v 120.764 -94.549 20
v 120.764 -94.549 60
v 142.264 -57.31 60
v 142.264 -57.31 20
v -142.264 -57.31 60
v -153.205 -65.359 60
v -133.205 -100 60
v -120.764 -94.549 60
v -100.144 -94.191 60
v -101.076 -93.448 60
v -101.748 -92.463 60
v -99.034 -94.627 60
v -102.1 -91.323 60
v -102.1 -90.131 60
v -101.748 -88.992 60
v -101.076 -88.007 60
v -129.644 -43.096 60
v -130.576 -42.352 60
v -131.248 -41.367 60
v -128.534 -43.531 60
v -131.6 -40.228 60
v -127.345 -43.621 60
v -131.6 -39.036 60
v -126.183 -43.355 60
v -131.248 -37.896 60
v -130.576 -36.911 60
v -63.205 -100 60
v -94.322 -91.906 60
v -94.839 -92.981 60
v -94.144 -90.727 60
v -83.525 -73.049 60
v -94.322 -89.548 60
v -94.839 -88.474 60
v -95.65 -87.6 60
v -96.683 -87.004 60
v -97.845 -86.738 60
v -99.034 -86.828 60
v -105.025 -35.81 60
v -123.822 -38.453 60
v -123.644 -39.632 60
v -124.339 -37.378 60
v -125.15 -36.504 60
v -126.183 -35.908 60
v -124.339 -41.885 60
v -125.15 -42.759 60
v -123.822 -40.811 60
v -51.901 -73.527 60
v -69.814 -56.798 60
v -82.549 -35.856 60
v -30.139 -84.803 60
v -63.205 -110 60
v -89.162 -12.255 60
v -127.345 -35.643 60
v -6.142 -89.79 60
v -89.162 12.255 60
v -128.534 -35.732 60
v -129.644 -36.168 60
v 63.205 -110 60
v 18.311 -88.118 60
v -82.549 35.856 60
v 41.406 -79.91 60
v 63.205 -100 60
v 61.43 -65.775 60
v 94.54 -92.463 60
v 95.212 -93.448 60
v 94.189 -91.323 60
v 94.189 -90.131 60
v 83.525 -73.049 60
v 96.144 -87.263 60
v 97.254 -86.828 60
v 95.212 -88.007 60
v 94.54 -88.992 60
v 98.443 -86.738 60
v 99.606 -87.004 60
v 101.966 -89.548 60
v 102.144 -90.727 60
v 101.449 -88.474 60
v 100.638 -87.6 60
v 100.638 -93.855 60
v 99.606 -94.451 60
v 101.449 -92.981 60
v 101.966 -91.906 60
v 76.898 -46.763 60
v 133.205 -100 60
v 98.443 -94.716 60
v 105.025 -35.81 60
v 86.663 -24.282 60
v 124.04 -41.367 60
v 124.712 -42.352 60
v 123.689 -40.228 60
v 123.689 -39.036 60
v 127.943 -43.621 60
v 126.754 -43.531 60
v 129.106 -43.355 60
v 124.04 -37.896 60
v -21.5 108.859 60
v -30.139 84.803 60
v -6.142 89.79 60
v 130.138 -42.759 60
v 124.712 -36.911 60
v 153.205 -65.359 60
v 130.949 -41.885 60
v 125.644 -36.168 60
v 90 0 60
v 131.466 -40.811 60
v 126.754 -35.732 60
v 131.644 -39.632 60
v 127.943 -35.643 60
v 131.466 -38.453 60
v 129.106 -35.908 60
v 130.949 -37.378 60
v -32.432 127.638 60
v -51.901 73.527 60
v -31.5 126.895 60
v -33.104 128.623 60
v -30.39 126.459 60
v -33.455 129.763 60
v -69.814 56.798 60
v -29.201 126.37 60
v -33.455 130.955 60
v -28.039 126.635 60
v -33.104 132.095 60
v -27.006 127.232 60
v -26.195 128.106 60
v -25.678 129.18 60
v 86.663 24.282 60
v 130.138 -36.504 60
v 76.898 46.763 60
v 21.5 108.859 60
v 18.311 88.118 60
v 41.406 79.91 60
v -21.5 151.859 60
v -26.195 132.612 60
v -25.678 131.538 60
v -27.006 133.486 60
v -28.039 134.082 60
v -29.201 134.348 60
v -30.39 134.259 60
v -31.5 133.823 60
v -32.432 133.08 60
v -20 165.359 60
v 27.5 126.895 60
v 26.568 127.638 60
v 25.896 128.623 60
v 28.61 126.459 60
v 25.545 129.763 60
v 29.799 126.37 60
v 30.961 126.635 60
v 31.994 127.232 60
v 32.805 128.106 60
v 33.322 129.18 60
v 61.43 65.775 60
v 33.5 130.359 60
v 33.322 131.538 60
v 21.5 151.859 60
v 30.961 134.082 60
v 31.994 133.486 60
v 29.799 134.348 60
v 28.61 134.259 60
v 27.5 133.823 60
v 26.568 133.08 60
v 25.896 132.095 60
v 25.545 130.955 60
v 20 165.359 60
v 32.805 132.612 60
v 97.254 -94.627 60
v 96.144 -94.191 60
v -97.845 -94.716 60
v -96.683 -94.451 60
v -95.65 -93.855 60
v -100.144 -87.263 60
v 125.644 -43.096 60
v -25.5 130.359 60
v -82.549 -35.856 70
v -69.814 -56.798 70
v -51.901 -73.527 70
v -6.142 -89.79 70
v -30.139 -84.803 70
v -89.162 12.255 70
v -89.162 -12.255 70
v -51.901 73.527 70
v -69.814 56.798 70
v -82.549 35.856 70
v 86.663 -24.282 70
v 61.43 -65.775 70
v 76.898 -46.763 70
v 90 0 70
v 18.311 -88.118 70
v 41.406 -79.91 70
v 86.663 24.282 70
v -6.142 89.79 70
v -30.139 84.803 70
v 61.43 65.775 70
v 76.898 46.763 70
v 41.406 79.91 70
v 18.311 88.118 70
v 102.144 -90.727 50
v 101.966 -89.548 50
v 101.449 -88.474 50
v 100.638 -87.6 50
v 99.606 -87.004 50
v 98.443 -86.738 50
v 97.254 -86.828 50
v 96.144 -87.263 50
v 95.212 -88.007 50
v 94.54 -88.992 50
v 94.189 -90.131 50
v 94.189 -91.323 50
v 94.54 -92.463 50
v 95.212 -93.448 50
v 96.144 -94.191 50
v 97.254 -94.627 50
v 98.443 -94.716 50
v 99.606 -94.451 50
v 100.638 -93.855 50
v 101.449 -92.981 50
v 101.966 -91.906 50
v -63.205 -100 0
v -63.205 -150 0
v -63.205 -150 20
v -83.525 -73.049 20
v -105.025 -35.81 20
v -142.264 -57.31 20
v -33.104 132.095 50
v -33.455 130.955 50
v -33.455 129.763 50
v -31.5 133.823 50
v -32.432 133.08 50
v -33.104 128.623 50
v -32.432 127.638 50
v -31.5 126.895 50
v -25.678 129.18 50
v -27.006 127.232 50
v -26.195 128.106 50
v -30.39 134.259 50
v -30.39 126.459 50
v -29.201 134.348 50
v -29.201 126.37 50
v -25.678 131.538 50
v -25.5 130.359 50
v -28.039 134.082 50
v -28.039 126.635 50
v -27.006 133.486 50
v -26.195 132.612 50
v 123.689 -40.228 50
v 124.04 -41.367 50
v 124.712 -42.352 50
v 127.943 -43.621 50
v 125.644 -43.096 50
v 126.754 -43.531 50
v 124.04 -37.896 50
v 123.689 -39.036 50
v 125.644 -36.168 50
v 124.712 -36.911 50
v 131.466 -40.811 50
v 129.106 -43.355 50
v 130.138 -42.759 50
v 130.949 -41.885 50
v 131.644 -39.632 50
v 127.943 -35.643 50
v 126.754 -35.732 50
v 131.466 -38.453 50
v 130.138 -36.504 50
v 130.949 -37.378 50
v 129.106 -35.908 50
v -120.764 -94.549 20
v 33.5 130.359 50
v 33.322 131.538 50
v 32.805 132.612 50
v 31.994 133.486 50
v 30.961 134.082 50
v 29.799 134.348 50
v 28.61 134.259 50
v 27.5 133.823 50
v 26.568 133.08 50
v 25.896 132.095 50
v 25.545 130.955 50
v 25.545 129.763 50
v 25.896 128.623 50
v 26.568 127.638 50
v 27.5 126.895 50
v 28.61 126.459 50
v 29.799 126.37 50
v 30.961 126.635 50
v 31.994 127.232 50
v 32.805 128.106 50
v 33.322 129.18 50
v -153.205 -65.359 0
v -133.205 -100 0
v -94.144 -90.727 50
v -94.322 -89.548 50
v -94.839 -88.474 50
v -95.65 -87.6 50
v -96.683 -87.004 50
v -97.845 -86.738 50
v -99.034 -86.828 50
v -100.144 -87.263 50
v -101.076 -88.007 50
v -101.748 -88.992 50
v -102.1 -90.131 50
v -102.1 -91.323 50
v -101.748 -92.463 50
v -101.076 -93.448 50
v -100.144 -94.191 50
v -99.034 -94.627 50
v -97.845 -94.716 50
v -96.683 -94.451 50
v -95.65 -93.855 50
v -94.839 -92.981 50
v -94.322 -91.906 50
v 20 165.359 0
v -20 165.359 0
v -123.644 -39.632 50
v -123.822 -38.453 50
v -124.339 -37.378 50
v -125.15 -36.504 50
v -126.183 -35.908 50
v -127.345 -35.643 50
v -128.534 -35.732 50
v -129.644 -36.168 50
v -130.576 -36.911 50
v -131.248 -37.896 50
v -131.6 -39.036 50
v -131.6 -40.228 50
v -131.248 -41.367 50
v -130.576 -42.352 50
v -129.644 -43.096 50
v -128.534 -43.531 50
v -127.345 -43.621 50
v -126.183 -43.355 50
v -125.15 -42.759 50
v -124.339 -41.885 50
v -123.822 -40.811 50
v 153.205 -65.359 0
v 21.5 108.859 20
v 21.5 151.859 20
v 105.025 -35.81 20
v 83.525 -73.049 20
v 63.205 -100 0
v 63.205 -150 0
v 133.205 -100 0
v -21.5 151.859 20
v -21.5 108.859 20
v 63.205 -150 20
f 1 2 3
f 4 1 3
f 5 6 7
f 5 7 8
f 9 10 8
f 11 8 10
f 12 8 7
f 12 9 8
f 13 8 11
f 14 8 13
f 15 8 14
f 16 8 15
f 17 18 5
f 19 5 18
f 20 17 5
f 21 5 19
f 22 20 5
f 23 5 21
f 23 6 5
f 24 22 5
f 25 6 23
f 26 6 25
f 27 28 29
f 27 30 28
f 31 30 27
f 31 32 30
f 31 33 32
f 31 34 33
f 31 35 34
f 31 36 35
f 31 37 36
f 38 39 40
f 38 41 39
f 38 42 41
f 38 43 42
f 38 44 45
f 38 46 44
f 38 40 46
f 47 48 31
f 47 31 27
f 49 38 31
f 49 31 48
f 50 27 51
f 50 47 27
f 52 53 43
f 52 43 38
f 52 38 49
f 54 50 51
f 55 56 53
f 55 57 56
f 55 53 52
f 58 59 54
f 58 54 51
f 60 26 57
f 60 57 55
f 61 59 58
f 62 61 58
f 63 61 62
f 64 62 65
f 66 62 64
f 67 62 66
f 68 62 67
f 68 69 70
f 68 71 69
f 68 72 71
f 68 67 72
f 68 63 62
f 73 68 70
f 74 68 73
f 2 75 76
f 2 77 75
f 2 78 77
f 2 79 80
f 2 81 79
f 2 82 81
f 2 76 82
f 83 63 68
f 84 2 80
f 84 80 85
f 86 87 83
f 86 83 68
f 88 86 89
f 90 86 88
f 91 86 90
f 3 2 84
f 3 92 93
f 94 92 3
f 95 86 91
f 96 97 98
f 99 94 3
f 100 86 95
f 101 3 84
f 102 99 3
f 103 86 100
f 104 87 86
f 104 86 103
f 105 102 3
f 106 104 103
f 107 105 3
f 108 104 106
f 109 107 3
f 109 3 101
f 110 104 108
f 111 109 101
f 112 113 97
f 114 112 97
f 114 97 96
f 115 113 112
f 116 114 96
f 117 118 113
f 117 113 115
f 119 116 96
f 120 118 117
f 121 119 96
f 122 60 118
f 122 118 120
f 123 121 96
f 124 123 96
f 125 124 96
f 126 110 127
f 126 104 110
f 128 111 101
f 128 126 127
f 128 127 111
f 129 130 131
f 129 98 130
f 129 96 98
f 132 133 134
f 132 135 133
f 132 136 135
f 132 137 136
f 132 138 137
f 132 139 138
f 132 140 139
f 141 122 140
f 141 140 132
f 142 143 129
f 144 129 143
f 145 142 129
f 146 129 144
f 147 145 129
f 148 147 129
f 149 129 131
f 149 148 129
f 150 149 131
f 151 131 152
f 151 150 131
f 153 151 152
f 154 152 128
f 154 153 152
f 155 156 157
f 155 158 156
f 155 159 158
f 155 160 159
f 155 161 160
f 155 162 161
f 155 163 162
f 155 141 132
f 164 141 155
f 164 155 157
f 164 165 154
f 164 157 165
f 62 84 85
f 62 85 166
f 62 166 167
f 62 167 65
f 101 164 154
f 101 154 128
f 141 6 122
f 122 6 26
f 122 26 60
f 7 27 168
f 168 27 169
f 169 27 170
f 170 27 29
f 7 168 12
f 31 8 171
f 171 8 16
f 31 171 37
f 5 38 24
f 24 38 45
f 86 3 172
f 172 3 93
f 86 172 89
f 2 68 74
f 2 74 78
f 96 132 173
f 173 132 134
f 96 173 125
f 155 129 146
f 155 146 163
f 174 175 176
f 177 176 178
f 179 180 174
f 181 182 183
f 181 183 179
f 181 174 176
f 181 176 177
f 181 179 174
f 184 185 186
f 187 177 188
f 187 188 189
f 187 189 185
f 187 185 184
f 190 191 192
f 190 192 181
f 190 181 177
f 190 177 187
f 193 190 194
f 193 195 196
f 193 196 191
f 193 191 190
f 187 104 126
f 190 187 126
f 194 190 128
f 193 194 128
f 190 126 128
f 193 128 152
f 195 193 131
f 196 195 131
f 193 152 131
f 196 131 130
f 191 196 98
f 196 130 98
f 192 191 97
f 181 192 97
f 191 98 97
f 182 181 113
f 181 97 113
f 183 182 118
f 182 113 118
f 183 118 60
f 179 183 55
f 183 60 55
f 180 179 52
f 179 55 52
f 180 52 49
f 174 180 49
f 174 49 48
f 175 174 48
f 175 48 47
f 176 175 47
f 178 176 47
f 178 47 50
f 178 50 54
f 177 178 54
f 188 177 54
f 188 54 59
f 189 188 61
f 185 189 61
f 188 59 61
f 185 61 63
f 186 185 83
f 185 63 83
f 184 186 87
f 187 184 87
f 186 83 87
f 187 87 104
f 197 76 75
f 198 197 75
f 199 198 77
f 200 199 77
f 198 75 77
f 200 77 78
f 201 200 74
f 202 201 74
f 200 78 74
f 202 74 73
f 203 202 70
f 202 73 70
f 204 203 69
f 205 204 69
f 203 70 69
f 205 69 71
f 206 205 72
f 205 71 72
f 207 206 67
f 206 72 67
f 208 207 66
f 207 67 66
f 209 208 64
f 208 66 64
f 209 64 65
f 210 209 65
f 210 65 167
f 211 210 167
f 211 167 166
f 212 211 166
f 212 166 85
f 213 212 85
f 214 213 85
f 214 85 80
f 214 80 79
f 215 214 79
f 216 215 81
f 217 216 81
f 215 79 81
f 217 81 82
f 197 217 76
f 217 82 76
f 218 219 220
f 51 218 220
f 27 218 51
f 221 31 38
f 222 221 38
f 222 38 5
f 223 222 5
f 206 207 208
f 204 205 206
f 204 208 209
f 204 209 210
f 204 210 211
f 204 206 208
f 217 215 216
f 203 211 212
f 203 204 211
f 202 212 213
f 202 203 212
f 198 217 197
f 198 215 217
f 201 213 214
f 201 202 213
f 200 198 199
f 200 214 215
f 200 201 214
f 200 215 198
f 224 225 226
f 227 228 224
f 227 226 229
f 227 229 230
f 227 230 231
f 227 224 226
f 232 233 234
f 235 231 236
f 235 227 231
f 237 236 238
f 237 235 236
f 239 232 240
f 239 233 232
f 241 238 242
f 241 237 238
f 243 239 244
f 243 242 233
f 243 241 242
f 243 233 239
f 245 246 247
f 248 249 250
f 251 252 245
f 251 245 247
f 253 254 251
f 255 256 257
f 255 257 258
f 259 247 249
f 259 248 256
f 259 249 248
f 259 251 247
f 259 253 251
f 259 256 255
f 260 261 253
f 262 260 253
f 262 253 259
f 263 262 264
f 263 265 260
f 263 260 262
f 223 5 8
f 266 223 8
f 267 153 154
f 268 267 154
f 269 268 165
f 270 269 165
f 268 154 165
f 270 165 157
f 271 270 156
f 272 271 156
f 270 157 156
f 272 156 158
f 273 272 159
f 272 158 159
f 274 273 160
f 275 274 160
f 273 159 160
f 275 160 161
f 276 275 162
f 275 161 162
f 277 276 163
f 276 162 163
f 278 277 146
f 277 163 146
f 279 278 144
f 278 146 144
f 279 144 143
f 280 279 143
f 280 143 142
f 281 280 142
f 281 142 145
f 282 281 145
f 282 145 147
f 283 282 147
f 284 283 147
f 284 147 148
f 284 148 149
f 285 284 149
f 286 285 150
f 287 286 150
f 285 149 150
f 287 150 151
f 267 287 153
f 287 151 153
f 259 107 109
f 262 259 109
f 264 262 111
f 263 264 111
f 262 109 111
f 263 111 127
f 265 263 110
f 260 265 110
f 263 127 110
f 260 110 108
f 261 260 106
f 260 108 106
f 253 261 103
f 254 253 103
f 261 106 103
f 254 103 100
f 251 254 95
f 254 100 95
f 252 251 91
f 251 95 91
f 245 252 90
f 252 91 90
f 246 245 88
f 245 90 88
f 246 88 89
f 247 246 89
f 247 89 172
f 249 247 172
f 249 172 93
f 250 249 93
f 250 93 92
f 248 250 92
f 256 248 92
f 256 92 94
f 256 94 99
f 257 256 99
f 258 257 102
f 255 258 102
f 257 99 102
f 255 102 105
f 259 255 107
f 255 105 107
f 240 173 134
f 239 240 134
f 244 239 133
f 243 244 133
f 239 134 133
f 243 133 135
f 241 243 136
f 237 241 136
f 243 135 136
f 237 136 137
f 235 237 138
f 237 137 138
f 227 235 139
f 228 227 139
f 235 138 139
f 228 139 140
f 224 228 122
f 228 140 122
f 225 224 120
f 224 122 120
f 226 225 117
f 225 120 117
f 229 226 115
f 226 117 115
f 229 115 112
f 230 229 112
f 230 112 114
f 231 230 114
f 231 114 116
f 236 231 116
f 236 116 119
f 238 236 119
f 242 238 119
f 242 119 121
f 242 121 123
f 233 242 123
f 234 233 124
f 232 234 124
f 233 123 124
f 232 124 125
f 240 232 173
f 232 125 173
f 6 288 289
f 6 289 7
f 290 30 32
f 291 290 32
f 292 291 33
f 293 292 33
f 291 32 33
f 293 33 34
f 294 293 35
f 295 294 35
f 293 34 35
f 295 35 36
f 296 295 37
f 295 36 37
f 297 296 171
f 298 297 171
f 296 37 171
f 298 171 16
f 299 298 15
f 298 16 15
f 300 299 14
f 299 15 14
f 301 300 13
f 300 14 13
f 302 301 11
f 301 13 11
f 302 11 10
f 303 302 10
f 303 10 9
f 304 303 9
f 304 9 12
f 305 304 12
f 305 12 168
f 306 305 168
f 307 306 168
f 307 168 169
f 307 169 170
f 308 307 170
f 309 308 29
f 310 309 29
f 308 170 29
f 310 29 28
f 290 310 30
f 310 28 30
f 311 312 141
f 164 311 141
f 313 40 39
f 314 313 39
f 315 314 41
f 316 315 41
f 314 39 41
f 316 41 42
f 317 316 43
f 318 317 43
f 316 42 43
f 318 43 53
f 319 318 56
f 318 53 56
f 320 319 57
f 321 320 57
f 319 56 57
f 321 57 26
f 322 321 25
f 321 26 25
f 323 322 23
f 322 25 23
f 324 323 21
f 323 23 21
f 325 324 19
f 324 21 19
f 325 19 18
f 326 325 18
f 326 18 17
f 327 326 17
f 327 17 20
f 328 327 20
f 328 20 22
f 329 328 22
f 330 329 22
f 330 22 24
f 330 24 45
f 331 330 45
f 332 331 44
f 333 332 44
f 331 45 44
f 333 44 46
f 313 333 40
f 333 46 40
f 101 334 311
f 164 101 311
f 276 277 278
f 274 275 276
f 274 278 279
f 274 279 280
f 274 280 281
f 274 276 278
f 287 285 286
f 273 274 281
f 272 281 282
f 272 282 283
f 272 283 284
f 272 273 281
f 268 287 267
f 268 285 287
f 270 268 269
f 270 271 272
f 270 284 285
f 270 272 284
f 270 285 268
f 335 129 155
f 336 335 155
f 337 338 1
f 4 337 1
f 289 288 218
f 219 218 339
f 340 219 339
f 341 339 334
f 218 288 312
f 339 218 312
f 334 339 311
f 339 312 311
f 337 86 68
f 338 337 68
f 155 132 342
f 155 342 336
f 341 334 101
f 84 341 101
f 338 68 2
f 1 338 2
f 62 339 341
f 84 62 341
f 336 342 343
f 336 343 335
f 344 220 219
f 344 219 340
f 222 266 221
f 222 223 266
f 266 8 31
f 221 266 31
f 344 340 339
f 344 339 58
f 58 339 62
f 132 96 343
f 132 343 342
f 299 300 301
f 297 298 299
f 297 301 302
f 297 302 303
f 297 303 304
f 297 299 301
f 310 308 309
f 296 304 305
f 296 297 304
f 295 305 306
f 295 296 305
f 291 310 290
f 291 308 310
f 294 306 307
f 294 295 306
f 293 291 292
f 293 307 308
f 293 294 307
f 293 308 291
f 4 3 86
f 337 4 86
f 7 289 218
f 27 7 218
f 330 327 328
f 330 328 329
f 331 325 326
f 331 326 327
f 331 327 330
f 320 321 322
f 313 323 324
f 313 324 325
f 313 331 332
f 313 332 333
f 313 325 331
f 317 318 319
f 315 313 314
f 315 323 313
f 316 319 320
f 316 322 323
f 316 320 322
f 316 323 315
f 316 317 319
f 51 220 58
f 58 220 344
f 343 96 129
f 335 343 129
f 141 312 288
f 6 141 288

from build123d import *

# Parameters (mm, degrees)
F1_DEPTH  = 60
F2_SIZE   = 40
F3_R      = 90
F4_DEPTH  = 10
F5_W      = 43
F5_H      = 43
F6_DEPTH  = 40
F7_R      = 4
F8_DEPTH  = 10
F9_W      = 126.410162
F9_H      = 60
F10_DEPTH = 50
F11_SIZE  = 40


with BuildPart() as f1:
    # F0 (on Top) → F1 (new body)
    with BuildSketch(Plane.XY):
        Polygon((-173.205081, -100), (173.205081, -100), (0, 200), align=None)
    extrude(amount=F1_DEPTH)

    # F2
    f2_edges = [f1.edges().sort_by_distance(p)[0] for p in [
        (-173.205081, -100, 30),
        (173.205081, -100, 30),
        (0, 200, 30),
    ]]
    chamfer(f2_edges, length=F2_SIZE)

    # F3 (on face) → F4 (join)
    with BuildSketch(Plane.XY.offset(60)):
        Circle(F3_R)
    extrude(amount=F4_DEPTH)

    # F5 (on face) → F6 (cut)
    with BuildSketch(Plane.XY.offset(60)):
        with Locations((0, 130.358984)):
            Rectangle(F5_W, F5_H)
        Polygon((-120.763738, -94.549038), (-83.524645, -73.049038), (-105.024645, -35.809946), (-142.263738, -57.309946), align=None)
        Polygon((142.263738, -57.309946), (105.024645, -35.809946), (83.524645, -73.049038), (120.763738, -94.549038), align=None)
    extrude(amount=-F6_DEPTH, mode=Mode.SUBTRACT)

    # F7 (on face) → F8 (cut)
    with BuildSketch(Plane.XY.offset(60)):
        with Locations((-29.5, 130.358984)):
            Circle(F7_R)
        with Locations((29.5, 130.358984)):
            Circle(F7_R)
        with Locations((-98.144192, -90.727241)):
            Circle(F7_R)
        with Locations((-127.644192, -39.631743)):
            Circle(F7_R)
        with Locations((127.644192, -39.631743)):
            Circle(F7_R)
        with Locations((98.144192, -90.727241)):
            Circle(F7_R)
    extrude(amount=-F8_DEPTH, mode=Mode.SUBTRACT)

    # F9 (on face) → F10 (join)
    with BuildSketch(Plane.XZ.offset(100)):
        with Locations((0, 30)):
            Rectangle(F9_W, F9_H)
    extrude(amount=F10_DEPTH)

    # F11
    f11_edges = [f1.edges().sort_by_distance(p)[0] for p in [
        (0, -150, 60),
    ]]
    chamfer(f11_edges, length=F11_SIZE)


solid = f1.part
